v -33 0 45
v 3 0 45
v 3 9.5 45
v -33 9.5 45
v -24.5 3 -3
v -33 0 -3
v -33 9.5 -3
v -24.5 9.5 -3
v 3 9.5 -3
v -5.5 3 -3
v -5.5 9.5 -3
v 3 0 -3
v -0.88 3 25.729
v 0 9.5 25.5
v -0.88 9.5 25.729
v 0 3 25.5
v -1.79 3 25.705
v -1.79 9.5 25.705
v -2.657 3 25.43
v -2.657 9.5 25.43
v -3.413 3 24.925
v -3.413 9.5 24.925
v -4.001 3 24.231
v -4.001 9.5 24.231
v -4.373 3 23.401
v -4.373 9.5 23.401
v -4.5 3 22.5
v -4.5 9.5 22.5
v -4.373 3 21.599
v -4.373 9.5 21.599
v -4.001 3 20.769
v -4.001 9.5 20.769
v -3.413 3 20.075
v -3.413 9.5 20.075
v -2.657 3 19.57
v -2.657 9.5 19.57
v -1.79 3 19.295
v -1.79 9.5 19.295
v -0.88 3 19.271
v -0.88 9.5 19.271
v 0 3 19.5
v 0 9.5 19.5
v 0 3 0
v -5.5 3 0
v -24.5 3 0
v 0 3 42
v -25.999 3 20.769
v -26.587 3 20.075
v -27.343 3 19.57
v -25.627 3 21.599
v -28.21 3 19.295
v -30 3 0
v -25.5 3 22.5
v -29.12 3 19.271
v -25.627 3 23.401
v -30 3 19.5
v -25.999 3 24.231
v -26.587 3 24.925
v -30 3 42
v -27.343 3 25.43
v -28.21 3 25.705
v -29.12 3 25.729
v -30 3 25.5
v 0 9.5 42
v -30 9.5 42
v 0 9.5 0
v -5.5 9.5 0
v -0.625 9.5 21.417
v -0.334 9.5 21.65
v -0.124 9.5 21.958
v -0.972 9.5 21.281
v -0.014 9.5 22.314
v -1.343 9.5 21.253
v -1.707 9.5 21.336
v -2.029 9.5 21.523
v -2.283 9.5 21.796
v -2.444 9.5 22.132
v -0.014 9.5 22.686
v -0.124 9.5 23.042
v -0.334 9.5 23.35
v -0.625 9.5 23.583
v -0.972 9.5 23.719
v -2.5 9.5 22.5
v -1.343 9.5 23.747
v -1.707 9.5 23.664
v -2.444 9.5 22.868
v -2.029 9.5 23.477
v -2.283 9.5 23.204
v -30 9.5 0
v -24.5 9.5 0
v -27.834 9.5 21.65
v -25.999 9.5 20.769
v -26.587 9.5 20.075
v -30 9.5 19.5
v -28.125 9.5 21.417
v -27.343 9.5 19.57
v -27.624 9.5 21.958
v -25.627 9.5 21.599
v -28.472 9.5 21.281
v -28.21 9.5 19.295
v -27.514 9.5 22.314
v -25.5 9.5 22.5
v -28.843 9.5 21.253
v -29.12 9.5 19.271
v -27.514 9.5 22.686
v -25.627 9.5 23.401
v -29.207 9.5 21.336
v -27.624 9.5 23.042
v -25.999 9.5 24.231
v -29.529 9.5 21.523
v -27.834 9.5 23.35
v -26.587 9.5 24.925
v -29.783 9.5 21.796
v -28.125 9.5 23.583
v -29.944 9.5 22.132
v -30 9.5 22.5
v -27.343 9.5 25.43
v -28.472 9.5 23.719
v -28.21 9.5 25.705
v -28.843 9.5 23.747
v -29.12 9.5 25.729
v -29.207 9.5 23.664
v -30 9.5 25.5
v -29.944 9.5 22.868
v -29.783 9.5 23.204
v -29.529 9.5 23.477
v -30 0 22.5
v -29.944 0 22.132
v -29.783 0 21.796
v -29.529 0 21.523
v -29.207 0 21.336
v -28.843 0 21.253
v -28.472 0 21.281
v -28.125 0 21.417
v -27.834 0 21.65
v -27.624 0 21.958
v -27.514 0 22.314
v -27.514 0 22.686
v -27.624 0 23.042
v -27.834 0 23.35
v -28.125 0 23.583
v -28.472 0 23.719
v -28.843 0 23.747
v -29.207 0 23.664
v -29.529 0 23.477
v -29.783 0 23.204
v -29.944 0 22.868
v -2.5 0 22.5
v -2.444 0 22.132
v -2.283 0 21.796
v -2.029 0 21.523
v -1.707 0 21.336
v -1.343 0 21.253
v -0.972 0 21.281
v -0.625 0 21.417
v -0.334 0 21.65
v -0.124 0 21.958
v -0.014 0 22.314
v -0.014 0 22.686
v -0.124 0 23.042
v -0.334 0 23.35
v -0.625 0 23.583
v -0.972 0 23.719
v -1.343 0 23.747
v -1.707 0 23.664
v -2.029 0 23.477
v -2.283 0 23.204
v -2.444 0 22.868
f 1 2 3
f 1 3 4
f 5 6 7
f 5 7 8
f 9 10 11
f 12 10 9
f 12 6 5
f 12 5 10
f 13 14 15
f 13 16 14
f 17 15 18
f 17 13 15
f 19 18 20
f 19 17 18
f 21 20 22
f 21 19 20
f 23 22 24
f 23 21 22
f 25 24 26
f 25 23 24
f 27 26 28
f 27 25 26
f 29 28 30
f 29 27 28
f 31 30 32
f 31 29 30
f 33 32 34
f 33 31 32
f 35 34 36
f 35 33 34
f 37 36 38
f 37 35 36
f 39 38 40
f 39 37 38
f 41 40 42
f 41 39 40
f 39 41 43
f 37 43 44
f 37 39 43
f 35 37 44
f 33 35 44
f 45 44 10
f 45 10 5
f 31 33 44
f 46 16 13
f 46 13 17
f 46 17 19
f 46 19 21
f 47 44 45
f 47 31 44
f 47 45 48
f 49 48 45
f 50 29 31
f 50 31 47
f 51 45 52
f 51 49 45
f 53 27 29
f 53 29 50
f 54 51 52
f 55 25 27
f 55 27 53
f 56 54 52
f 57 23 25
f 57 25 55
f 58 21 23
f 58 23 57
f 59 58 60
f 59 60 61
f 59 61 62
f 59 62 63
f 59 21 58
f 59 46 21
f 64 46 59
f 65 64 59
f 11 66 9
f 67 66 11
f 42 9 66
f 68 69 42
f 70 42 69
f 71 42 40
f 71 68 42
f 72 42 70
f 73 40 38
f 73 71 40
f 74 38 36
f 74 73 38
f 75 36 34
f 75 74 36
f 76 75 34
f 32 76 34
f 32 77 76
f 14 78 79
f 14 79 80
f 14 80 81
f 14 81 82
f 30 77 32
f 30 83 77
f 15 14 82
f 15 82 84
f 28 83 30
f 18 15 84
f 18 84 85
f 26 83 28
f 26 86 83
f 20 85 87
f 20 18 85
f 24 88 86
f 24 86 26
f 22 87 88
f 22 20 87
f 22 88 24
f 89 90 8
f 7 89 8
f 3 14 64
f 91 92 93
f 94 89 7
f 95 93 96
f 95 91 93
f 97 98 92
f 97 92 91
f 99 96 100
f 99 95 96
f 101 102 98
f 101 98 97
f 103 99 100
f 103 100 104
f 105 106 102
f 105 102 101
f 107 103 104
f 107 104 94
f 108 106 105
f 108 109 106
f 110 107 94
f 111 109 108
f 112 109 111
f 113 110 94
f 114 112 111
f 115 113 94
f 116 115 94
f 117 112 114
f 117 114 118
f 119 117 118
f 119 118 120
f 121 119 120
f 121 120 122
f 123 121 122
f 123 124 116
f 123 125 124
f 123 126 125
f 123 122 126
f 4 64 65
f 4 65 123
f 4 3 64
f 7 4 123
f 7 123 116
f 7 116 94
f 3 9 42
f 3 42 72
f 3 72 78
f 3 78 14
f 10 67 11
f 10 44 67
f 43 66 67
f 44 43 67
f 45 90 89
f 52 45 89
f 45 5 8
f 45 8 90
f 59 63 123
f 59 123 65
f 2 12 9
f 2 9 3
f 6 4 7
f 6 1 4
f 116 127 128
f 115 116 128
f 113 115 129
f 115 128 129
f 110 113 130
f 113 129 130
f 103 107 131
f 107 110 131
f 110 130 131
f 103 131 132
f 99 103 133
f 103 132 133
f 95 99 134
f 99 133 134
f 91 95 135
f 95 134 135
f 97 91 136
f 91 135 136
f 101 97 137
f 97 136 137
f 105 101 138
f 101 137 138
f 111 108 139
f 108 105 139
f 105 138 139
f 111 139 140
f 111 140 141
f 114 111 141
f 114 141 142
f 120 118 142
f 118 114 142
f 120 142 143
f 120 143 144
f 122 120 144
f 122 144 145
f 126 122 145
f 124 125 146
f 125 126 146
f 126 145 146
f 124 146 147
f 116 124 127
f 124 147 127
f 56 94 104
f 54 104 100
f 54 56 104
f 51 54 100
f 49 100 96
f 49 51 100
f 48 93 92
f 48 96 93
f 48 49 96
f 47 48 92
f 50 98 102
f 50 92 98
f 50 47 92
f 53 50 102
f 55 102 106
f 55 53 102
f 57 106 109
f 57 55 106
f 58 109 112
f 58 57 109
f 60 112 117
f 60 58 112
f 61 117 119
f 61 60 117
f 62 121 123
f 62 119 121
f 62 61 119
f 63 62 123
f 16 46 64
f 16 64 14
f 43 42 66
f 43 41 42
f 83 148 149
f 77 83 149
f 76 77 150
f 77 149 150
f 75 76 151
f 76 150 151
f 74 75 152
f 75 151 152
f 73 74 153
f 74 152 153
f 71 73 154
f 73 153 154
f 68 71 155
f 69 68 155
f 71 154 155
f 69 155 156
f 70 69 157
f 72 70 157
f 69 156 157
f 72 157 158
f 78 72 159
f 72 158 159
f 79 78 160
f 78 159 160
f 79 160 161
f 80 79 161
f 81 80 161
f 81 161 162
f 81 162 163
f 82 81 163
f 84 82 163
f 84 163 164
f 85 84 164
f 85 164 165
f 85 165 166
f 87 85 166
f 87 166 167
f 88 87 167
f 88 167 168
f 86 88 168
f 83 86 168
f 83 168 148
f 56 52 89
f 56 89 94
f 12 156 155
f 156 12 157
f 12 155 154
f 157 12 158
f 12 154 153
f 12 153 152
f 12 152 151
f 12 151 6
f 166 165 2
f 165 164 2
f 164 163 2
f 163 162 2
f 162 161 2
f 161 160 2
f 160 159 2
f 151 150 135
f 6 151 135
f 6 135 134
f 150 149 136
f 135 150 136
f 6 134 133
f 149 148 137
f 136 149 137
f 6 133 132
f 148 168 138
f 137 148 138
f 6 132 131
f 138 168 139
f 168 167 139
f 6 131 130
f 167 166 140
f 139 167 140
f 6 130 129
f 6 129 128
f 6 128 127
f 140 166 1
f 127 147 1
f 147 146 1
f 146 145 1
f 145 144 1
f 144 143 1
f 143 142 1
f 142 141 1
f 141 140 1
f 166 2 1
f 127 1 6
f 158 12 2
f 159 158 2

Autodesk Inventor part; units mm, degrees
ref_plane "YZ Plane" through (0, 0, 0) normal (1, 0, 0) x (0, 1, 0)
ref_plane "XZ Plane" through (0, 0, 0) normal (0, 1, 0) x (-1, 0, 0)
ref_plane "XY Plane" through (0, 0, 0) normal (0, 0, 1) x (1, 0, 0)
sketch "Sketch1" plane through (0, 0, 0) normal (0, 1, 0) x (-1, 0, 0)
  line L0 (0, 0) -> (30, 0)
  line L1 (30, 0) -> (30, 45)
  line L2 (30, 45) -> (0, 45)
  line L3 (0, 45) -> (0, 0)
  line L4 (33, 0) -> (-3, 0)
  line L5 (-3, 0) -> (-3, 45)
  line L6 (-3, 45) -> (33, 45)
  line L7 (33, 45) -> (33, 0)
  line L8 (30, 45) -> (0, 45)
  line L9 (0, 45) -> (0, 42)
  line L10 (0, 42) -> (30, 42)
  line L11 (30, 42) -> (30, 45)
  line L12 (24.5, 0) -> (5.5, 0)
  line L13 (5.5, 0) -> (5.5, -3)
  line L14 (5.5, -3) -> (24.5, -3)
  line L15 (24.5, -3) -> (24.5, 0)
  line L16 (24.5, 0) -> (33, 0)
  line L17 (33, 0) -> (33, -3)
  line L18 (33, -3) -> (24.5, -3)
  line L19 (24.5, -3) -> (24.5, 0)
  line L20 (5.5, 0) -> (-3, 0)
  line L21 (-3, 0) -> (-3, -3)
  line L22 (-3, -3) -> (5.5, -3)
  line L23 (5.5, -3) -> (5.5, 0)
  circle A0 centre (28.75, 22.5) radius 1.25
  circle A1 centre (1.25, 22.5) radius 1.25
  circle A2 centre (28.75, 22.5) radius 3.25
  circle A3 centre (1.25, 22.5) radius 3.25
  point P0 (33, 22.5)
  point P1 (33, 22.5)
  point P2 (5.5, 0)
  point P3 (30, 19.5)
  point P4 (0, 19.5)
  point P5 (0, 25.5)
  point P6 (30, 25.5)
  dimension "d0" = 3
  dimension "d1" = 3
  dimension "d2" = 30
  dimension "d3" = 45
  dimension "d4" = 3
  dimension "d5" = 19
  dimension "d6" = 3
  dimension "d7" = 2.5
  dimension "d8" = 2.5
  dimension "d9" = 2
  dimension "d10" = 2
extrude "Extrusion1" add sketch "Sketch1" along normal blind 3
extrude "Extrusion2" add sketch "Sketch1" along normal blind 9.5 contours L4 L5 L6 L3 A3 | L0 L13 L22 L21 L4 | A3 L3 | L3 A3 | L0 L4 L17 L18 L15 | L1 A2 L6 L7 L4 | L3 L2 L1 L10 | A2 L1 | L1 A2
properties part number "dongle shell"
